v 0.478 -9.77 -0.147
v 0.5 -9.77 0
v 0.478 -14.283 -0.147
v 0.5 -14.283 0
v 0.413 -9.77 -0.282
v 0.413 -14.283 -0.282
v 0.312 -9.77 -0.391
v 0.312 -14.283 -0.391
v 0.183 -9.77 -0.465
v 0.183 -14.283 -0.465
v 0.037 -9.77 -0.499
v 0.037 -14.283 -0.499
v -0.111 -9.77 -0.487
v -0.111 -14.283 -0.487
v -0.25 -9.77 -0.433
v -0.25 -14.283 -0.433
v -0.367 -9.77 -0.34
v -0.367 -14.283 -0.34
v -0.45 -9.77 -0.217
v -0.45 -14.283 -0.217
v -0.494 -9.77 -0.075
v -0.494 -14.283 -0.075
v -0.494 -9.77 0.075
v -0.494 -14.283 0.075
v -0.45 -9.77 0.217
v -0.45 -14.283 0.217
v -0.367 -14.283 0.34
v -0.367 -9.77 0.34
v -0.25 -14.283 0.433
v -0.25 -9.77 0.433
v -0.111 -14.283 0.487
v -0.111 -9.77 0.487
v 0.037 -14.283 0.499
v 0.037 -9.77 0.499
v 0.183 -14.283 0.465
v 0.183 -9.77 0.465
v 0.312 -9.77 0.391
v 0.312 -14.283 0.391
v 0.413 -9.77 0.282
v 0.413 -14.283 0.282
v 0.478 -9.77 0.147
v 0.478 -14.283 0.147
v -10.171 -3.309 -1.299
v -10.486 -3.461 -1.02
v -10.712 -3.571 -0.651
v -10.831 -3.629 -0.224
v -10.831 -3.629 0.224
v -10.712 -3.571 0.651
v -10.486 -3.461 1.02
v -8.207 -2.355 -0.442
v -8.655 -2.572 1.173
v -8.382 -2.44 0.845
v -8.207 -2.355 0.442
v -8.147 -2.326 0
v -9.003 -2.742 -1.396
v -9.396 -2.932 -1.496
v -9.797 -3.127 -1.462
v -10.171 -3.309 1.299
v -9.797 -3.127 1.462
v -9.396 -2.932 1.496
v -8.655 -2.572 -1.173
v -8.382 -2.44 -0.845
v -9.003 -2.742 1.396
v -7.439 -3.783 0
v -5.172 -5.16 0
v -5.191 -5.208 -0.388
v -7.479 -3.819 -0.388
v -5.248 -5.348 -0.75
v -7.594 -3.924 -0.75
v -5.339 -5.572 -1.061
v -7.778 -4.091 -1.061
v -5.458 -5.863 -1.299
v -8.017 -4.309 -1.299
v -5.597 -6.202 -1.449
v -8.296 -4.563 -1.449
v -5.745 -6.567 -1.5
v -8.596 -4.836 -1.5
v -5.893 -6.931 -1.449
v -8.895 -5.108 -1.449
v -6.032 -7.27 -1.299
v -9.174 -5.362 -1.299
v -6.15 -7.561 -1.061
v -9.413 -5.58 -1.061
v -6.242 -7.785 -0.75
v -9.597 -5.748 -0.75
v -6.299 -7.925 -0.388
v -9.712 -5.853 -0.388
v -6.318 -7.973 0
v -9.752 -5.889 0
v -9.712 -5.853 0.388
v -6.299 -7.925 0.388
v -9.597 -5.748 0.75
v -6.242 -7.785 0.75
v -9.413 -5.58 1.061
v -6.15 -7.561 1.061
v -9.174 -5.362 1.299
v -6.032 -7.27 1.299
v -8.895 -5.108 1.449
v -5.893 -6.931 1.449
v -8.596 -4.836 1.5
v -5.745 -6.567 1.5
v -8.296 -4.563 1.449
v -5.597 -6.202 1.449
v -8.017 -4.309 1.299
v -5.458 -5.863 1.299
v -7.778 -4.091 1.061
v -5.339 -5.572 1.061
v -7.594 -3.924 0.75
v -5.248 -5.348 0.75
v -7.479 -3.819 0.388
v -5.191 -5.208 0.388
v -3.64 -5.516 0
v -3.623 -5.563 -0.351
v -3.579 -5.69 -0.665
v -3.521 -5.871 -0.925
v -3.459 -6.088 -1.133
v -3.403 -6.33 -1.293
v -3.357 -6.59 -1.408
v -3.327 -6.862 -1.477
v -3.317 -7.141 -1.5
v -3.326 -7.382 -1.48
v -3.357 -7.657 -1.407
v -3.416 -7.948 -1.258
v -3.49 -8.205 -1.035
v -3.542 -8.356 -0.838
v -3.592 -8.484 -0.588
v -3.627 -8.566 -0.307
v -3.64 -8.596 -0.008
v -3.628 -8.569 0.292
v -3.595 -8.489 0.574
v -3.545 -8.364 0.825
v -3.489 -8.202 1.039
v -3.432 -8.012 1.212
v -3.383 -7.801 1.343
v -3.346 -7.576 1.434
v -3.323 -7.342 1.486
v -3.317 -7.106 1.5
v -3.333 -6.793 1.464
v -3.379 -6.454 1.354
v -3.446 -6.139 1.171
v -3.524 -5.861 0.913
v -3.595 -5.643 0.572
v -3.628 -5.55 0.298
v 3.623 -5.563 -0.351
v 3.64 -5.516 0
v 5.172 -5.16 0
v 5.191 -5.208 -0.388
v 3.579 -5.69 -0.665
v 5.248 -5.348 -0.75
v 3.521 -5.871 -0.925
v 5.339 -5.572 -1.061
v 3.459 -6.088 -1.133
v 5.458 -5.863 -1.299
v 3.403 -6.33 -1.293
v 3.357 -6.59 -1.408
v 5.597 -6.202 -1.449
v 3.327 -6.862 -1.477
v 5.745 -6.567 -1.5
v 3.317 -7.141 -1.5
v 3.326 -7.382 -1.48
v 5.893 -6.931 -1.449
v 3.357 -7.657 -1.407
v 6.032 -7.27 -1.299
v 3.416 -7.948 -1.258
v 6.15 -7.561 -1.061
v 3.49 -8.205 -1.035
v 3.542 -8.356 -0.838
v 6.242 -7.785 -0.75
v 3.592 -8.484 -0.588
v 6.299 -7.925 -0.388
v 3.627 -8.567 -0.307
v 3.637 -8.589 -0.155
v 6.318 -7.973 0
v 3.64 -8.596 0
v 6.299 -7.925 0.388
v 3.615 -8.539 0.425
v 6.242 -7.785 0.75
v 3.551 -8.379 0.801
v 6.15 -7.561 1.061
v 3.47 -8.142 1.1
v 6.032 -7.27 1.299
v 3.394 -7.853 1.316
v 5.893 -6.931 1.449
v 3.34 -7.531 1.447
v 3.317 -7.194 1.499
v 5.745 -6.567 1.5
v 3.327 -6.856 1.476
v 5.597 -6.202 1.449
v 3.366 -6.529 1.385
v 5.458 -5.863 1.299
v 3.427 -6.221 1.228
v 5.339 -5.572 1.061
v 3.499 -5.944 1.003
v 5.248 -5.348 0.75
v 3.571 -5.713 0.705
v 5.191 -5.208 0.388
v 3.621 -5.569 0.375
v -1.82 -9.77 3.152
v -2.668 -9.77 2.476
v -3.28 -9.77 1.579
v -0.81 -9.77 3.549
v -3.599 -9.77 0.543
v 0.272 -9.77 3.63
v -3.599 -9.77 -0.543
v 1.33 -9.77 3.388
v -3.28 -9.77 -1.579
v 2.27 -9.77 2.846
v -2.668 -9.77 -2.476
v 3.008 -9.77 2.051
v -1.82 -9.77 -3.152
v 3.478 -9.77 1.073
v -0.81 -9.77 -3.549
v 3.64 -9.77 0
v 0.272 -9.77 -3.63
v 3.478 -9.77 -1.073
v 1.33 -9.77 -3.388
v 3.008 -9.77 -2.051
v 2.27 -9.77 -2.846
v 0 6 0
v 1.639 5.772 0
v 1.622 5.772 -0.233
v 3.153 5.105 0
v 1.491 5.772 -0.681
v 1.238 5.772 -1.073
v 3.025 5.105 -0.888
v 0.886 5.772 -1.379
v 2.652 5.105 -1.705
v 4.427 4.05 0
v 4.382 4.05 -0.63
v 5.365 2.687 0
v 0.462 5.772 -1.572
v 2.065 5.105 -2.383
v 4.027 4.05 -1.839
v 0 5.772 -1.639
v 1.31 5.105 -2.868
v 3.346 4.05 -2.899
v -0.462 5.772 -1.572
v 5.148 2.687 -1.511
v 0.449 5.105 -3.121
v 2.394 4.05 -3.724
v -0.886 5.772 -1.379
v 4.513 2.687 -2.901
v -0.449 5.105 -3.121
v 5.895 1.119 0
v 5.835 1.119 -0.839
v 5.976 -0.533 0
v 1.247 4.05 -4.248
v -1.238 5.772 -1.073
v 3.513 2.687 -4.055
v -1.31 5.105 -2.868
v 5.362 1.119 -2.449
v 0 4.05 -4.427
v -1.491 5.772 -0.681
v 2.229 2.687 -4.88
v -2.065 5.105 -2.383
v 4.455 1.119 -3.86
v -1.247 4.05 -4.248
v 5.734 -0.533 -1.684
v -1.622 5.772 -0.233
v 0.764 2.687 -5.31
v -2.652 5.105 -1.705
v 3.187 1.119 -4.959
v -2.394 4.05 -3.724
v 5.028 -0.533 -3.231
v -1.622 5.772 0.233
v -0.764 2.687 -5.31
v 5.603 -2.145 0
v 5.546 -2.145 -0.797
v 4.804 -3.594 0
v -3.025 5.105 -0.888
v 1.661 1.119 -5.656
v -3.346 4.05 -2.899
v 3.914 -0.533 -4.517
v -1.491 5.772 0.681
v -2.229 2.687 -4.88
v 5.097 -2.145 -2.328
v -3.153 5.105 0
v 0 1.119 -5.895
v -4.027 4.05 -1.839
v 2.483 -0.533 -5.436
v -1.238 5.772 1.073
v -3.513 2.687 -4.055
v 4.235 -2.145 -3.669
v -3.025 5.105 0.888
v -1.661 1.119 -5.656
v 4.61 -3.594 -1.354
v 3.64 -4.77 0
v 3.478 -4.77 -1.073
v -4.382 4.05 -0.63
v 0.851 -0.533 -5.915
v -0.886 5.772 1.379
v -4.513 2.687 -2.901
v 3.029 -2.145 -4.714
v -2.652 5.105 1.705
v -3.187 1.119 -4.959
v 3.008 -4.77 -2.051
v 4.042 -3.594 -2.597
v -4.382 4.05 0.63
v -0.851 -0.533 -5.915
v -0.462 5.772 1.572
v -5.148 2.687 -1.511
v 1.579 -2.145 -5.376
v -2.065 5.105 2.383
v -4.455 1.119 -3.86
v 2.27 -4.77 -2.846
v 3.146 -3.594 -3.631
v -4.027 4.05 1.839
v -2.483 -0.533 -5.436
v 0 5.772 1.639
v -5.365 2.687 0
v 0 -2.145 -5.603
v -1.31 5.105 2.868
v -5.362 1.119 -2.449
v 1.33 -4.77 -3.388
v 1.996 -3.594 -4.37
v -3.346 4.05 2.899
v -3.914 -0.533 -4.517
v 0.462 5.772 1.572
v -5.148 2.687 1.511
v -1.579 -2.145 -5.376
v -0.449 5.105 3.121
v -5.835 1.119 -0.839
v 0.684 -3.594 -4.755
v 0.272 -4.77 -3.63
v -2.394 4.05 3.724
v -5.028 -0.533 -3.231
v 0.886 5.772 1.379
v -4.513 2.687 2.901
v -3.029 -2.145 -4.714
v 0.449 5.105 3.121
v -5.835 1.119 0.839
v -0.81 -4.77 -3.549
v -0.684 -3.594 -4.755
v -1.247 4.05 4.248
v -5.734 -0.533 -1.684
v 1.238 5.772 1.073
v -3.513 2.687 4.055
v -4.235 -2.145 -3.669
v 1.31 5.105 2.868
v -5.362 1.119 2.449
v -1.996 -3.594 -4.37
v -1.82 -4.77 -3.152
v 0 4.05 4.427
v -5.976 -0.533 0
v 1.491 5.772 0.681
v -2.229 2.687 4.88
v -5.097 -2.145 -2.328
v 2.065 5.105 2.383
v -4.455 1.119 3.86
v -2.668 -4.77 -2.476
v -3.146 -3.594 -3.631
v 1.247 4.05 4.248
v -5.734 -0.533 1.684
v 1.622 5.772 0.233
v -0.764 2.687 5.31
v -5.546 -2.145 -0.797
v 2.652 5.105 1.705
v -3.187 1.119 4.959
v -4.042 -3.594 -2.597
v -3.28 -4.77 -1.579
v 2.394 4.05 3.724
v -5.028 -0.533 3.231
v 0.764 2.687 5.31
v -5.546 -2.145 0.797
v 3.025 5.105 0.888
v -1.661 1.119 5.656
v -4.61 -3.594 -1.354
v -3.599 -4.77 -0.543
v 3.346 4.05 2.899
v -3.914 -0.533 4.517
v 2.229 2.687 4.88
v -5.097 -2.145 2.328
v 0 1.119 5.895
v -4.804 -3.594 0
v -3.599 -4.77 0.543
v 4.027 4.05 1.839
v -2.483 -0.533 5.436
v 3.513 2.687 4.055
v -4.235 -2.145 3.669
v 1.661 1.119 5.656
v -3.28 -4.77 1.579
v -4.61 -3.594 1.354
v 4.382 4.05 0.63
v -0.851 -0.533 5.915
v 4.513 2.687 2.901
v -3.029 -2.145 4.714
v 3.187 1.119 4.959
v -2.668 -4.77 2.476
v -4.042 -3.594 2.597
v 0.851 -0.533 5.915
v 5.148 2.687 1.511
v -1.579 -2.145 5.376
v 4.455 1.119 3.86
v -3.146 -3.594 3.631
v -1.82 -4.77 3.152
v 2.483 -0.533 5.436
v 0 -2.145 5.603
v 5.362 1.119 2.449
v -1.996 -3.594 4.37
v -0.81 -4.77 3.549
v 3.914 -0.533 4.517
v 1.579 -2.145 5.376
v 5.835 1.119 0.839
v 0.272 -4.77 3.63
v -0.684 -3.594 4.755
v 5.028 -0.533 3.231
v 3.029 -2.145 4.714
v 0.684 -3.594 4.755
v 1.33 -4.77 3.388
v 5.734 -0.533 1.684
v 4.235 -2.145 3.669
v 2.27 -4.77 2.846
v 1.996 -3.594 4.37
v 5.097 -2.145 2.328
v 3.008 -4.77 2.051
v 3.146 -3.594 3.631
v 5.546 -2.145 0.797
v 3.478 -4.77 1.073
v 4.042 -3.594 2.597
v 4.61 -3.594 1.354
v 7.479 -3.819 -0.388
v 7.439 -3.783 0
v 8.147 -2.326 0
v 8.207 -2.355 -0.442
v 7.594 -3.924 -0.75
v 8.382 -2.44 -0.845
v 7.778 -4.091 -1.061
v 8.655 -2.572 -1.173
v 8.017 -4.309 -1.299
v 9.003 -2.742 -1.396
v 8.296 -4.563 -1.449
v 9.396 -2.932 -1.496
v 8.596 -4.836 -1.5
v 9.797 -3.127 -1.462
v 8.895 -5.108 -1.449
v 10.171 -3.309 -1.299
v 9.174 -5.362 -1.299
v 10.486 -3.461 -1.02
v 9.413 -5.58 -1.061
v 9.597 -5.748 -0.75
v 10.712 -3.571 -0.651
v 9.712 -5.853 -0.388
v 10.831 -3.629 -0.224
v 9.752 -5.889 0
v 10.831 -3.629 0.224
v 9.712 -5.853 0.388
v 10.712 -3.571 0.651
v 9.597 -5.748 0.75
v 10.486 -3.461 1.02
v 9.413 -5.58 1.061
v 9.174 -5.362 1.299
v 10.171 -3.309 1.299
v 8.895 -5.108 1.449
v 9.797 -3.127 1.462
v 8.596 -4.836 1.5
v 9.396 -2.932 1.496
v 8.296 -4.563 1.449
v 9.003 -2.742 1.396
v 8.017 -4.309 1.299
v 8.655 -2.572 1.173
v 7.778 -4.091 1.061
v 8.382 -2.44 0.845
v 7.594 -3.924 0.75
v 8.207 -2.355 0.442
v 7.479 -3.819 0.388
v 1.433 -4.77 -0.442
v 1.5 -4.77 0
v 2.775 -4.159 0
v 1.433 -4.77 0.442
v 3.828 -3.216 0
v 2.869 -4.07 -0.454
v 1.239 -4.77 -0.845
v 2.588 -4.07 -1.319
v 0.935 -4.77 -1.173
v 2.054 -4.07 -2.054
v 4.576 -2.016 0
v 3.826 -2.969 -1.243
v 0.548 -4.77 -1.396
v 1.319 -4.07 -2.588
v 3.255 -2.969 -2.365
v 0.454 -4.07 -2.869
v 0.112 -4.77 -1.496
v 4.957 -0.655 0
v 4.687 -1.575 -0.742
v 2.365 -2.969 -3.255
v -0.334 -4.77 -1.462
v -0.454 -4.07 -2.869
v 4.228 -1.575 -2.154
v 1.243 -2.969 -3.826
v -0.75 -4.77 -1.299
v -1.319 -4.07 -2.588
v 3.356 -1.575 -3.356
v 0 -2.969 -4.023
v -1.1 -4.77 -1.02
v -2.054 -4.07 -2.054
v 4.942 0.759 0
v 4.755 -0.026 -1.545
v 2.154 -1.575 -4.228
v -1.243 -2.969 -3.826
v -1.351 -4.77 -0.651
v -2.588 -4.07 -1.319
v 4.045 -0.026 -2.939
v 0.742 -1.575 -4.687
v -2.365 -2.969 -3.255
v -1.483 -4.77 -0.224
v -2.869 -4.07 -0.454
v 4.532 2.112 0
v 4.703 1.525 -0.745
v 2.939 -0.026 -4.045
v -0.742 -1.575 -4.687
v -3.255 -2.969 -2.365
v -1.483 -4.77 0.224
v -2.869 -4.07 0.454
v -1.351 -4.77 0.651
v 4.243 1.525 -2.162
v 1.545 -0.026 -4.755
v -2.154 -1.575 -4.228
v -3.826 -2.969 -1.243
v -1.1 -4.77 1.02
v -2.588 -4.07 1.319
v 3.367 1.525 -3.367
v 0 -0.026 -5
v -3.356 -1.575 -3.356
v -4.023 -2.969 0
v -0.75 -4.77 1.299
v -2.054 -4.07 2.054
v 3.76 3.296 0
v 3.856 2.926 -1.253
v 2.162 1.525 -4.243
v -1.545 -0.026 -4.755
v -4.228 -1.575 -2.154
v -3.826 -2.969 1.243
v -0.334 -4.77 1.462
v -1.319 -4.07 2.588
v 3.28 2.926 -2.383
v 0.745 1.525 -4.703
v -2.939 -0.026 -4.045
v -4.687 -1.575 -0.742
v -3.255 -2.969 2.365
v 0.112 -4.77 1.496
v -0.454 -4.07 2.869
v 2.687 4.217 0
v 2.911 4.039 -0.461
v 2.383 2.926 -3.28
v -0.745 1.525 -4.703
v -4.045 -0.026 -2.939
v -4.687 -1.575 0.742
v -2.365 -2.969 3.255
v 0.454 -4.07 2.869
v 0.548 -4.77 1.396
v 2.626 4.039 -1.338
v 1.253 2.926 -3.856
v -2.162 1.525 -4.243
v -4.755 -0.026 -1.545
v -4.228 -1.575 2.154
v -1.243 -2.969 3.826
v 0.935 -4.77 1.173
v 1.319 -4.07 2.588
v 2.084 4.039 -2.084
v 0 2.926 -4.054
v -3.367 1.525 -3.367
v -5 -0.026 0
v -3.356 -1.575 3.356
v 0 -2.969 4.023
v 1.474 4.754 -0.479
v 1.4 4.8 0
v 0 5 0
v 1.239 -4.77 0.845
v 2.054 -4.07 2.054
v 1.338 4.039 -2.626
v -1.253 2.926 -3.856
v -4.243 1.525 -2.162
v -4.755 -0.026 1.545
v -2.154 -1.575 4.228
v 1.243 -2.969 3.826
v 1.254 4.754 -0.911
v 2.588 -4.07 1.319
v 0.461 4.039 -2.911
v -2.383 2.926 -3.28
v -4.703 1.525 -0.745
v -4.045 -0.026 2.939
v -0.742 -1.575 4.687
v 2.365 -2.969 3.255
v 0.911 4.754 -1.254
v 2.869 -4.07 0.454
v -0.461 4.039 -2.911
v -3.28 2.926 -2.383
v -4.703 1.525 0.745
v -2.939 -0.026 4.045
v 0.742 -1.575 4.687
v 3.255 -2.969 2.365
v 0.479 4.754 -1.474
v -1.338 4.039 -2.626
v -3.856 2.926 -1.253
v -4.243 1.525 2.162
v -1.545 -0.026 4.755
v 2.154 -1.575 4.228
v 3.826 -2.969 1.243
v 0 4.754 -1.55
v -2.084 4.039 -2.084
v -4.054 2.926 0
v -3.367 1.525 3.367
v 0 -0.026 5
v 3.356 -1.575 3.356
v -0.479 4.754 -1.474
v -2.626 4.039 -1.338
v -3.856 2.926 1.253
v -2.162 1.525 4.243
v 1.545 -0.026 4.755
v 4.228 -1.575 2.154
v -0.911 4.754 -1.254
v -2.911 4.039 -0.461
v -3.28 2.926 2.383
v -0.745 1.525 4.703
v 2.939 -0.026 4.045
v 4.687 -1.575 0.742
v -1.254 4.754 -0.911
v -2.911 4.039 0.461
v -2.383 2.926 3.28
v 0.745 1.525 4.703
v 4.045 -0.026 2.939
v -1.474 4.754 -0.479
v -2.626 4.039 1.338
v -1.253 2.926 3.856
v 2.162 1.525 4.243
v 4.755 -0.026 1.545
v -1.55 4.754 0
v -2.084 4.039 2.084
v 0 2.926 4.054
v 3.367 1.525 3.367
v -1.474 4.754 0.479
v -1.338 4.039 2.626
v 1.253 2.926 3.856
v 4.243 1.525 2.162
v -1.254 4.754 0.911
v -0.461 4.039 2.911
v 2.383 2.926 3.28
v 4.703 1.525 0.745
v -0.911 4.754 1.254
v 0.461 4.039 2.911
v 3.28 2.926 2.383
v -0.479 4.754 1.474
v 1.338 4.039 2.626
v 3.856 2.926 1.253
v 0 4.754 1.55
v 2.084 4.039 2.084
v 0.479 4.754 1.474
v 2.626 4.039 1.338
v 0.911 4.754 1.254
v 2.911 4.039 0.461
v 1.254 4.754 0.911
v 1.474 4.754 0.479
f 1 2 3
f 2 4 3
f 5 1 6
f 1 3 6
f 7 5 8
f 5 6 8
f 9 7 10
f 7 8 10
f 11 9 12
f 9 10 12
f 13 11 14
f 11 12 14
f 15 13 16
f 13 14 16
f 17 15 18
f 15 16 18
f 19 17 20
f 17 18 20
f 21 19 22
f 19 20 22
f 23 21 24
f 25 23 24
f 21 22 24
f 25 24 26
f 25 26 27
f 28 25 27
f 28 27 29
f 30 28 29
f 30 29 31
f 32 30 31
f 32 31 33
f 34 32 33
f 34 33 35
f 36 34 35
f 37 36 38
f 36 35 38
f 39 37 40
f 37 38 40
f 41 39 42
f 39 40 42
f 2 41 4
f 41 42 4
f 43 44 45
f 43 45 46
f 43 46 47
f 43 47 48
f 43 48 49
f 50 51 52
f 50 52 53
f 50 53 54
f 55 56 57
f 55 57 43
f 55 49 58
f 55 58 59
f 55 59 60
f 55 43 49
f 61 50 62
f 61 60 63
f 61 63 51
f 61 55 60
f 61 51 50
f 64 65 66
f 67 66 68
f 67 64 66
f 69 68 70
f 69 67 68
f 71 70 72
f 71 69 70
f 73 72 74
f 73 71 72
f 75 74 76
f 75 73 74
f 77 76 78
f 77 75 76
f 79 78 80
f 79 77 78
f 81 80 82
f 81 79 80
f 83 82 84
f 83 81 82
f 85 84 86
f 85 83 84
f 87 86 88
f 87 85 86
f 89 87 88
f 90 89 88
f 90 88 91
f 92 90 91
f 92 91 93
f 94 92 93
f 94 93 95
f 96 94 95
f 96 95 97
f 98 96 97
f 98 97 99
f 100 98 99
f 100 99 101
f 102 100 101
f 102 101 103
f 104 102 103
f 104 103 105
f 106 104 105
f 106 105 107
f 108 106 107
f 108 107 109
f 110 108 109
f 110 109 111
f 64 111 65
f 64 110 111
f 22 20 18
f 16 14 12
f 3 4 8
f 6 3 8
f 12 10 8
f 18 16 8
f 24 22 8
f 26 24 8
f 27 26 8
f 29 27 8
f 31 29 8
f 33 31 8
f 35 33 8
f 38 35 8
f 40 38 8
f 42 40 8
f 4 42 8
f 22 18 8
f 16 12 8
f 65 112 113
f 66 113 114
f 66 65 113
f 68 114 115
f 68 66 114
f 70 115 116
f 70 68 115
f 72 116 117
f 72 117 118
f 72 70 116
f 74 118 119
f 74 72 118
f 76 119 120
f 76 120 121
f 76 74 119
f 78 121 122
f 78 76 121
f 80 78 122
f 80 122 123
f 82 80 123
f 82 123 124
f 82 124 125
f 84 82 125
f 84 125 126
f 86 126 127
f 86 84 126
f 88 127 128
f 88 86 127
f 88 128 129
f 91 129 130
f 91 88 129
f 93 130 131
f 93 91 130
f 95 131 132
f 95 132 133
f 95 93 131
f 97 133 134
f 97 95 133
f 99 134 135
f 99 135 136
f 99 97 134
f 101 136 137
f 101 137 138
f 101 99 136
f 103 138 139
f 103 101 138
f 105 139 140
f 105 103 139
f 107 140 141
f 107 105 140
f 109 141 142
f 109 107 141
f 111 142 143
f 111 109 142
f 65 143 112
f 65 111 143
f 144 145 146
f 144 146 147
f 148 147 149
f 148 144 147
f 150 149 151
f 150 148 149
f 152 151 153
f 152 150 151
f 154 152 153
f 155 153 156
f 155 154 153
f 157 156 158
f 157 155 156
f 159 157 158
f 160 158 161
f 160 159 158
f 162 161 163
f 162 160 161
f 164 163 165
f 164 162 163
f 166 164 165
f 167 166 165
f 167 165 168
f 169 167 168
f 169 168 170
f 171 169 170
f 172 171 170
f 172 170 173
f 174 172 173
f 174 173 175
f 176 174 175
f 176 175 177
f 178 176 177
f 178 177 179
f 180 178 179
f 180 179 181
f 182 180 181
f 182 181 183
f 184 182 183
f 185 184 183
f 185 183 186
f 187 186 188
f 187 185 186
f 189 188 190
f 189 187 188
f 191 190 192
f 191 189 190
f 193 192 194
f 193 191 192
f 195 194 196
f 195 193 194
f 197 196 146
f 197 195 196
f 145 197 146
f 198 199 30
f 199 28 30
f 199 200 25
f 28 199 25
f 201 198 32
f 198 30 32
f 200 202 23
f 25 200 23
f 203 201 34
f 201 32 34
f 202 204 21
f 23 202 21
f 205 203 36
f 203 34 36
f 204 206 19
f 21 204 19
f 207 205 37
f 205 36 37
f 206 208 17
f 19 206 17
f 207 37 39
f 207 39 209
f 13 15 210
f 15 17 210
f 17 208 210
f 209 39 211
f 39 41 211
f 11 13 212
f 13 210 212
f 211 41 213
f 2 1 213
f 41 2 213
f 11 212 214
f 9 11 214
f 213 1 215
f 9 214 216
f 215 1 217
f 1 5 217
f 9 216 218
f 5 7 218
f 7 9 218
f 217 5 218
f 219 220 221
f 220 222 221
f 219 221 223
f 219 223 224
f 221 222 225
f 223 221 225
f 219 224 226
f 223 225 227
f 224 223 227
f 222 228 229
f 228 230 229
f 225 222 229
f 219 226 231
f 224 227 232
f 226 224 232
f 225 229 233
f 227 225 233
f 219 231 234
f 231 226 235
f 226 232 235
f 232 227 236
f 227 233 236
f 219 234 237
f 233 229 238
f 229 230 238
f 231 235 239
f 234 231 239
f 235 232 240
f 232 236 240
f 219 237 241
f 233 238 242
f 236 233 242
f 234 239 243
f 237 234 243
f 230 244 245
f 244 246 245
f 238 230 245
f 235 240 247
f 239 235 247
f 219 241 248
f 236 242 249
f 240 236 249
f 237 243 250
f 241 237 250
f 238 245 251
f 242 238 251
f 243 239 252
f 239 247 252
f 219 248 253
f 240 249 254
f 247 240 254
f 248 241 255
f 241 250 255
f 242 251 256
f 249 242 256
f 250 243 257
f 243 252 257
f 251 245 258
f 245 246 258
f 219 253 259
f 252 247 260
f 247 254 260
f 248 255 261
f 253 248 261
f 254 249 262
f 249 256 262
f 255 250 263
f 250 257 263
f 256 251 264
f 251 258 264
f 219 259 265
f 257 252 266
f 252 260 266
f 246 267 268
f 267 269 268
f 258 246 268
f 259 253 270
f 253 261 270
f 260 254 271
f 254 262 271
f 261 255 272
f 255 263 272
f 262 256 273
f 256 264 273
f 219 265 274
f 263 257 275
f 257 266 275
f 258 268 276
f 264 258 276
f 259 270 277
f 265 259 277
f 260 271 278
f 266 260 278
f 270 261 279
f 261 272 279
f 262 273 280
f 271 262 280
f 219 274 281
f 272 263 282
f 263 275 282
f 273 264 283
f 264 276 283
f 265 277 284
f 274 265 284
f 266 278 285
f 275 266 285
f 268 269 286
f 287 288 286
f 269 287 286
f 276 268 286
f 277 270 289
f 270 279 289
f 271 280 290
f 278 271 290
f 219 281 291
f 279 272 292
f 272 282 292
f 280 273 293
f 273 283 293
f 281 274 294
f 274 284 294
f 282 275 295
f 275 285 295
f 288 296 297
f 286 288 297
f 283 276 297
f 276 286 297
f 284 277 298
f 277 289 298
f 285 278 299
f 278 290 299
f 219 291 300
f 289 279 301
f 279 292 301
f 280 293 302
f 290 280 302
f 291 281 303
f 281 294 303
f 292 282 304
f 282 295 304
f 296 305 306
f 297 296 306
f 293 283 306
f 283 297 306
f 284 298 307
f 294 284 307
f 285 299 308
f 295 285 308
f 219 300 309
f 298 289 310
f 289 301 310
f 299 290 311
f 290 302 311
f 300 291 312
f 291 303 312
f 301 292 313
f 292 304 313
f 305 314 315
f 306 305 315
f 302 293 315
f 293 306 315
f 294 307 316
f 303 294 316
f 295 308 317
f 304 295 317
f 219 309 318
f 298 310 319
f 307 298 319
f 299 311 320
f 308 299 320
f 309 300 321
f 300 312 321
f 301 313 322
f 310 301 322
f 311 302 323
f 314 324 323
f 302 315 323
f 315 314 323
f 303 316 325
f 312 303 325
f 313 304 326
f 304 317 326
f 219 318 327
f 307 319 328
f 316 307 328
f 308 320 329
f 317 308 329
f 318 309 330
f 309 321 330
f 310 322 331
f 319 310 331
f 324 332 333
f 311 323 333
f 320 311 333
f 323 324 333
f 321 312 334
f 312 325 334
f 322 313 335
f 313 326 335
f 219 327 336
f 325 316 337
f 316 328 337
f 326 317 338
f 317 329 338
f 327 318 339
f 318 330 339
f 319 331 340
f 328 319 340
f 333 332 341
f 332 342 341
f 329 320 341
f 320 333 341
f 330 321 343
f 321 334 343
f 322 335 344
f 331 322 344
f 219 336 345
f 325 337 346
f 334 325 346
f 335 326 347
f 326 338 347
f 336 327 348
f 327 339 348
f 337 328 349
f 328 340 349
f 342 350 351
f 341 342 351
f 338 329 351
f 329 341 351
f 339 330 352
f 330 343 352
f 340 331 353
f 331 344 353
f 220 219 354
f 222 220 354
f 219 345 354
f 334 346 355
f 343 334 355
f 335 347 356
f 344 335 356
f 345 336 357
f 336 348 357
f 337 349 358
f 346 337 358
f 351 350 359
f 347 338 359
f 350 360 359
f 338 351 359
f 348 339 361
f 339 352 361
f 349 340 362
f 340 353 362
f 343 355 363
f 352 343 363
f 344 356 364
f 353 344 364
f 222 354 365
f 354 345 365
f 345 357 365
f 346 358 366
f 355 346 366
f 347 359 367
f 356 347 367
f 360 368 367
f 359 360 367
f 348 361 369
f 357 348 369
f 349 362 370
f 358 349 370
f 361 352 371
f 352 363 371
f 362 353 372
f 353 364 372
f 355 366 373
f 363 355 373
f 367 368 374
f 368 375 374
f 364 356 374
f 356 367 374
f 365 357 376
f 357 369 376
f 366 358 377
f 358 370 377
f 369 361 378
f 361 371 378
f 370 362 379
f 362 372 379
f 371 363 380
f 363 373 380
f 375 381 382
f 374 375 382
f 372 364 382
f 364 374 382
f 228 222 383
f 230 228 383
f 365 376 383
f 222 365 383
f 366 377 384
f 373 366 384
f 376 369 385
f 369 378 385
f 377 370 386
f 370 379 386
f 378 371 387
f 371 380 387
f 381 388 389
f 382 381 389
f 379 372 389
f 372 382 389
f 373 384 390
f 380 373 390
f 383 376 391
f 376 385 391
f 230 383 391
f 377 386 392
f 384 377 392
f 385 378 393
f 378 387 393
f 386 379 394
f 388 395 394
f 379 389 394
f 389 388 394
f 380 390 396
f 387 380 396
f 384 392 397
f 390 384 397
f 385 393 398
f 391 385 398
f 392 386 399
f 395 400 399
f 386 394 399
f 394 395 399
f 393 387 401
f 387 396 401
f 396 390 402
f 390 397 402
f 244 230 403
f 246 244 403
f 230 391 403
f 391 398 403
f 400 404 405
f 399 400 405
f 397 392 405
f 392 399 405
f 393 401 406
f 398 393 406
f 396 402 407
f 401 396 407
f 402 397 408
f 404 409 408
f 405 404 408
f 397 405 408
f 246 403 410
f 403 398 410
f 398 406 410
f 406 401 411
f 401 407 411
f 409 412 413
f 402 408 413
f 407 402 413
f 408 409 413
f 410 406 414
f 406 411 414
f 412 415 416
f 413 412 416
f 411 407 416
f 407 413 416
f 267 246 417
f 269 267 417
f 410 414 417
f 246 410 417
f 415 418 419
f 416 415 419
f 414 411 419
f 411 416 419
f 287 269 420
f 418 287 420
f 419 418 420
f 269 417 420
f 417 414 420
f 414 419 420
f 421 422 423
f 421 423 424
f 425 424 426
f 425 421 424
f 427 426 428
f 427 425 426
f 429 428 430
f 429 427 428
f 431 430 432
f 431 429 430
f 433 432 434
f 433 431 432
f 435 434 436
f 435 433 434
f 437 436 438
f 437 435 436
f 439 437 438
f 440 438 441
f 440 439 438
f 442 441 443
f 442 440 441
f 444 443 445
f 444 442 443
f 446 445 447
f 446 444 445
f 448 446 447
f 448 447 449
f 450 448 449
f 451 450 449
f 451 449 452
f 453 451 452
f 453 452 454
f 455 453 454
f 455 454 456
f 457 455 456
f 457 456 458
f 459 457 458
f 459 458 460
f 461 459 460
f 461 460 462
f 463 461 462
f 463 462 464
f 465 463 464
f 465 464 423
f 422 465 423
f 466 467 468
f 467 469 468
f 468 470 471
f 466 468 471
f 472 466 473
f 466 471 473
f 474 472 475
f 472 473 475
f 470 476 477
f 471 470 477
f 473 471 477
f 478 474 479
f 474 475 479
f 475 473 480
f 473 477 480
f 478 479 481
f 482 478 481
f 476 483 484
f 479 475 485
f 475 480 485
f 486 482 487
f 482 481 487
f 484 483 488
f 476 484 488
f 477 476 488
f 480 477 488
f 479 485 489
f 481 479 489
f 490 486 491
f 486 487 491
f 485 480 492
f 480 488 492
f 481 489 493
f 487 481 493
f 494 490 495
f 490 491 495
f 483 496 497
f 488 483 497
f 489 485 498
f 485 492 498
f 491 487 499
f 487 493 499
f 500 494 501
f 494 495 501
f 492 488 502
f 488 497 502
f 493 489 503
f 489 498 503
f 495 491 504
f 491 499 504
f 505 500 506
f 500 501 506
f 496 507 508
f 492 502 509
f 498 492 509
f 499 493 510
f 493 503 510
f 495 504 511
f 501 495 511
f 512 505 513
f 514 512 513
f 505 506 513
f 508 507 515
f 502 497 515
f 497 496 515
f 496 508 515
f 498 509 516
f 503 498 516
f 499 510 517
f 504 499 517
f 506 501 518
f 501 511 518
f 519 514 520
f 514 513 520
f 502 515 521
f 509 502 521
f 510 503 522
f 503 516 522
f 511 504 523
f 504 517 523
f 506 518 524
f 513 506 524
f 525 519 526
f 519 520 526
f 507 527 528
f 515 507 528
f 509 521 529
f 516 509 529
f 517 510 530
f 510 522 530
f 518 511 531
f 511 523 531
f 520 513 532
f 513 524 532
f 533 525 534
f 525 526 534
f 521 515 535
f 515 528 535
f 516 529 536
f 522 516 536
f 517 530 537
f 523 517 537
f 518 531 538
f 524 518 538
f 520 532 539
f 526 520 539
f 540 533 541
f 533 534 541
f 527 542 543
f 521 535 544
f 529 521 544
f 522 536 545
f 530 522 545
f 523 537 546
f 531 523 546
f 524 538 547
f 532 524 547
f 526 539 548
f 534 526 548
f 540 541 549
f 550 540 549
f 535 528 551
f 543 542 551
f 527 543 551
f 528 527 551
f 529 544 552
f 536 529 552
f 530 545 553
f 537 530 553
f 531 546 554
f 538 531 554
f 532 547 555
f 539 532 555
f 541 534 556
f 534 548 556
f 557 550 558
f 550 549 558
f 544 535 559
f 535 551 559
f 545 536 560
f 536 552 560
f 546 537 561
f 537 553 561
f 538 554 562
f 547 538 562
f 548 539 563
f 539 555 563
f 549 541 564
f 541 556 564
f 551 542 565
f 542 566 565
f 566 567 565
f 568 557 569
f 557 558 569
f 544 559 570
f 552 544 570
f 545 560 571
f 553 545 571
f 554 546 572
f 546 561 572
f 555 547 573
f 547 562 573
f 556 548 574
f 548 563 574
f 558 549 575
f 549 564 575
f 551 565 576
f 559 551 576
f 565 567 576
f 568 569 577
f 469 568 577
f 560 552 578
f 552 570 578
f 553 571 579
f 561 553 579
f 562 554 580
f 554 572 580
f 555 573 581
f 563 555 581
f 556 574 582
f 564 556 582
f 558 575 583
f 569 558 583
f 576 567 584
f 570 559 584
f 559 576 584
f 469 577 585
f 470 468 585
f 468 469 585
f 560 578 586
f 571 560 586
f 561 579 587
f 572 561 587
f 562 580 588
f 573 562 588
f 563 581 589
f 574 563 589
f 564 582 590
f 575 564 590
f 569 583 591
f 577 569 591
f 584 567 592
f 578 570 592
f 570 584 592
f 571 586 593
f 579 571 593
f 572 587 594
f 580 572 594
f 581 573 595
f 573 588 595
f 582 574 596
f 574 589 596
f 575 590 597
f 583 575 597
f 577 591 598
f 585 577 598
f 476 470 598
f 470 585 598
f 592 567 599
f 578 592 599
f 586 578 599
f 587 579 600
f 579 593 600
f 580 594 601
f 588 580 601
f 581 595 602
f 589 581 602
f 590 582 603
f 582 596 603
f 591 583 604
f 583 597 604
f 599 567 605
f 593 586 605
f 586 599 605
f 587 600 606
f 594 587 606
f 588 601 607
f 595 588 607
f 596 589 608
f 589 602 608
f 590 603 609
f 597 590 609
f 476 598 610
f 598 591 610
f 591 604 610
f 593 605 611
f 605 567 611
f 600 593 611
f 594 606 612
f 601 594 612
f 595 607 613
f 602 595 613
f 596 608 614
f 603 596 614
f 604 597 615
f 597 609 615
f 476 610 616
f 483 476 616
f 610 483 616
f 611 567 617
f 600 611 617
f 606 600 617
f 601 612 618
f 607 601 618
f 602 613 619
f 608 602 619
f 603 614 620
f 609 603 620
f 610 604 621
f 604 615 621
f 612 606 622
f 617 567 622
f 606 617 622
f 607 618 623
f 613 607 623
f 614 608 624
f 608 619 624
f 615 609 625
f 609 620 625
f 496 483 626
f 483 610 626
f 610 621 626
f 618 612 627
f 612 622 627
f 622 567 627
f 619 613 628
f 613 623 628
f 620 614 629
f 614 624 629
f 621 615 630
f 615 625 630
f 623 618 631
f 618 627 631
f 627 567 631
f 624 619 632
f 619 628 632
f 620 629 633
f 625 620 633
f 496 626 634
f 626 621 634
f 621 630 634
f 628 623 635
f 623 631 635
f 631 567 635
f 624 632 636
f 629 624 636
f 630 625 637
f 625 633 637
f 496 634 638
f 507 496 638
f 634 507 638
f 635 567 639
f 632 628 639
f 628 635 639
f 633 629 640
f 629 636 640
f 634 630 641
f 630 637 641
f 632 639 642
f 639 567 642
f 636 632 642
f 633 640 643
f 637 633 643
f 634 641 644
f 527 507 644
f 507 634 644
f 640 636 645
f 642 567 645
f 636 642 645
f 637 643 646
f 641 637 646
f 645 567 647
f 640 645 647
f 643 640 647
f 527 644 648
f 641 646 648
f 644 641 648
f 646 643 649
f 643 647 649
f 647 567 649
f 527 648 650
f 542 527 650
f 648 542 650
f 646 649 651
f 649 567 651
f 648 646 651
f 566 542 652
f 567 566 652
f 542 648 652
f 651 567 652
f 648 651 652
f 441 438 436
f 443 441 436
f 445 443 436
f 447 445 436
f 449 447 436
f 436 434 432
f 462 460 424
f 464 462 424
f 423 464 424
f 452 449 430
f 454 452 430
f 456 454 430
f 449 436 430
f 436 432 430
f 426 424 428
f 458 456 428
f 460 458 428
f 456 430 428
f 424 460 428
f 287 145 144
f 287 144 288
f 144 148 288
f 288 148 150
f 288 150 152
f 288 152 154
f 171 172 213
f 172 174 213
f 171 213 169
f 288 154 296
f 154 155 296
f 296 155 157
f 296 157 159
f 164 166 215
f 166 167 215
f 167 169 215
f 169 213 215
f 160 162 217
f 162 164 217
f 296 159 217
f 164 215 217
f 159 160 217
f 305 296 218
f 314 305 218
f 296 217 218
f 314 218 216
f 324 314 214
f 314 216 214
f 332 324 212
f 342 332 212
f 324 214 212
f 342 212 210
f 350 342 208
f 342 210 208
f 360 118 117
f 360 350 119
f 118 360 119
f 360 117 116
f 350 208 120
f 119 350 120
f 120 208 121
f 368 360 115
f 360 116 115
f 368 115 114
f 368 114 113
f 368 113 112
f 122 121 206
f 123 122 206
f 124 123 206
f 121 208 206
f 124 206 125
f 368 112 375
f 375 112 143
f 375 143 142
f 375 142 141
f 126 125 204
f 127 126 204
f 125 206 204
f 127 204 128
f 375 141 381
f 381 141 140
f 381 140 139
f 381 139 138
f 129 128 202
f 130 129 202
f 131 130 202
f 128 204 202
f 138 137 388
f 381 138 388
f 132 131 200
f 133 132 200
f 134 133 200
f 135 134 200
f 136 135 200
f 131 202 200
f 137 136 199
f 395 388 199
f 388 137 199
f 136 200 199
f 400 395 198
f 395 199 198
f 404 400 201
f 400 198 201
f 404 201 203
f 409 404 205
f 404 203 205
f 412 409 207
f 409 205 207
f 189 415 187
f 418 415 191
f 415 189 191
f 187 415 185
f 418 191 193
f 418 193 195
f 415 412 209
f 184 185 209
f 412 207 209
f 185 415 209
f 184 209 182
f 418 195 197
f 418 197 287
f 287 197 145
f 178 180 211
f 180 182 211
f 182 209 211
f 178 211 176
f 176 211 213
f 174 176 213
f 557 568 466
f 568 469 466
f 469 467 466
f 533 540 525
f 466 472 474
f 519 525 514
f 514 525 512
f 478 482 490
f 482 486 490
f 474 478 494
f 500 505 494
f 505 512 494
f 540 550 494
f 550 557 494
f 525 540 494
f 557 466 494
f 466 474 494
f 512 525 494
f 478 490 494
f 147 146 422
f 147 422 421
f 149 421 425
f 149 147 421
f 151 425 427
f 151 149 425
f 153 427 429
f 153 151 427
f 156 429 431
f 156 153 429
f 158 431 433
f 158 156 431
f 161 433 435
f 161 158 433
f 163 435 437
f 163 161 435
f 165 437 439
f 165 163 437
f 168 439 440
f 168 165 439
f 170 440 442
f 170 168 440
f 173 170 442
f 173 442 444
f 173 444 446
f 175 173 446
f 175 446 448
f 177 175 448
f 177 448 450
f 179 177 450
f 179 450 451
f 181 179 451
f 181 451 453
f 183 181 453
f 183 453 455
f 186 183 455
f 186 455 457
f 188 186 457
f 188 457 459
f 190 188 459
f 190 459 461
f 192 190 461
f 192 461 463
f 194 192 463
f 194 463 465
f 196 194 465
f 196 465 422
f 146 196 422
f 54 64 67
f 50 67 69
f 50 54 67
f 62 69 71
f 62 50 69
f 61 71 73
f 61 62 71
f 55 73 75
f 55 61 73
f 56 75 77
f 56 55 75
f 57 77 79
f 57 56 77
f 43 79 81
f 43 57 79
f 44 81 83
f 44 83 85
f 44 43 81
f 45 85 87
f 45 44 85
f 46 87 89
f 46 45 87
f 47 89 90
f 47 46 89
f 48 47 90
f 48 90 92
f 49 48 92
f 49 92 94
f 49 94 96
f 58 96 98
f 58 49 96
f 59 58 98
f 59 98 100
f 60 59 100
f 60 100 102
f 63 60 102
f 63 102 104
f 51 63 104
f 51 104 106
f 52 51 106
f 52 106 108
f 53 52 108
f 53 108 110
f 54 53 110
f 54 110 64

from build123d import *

# Parameters (mm, degrees)
SWEEP1_PROFILE_R = 1.5


with BuildPart() as part:
    # Esquisse1 → Révolution4 (revolve)
    with BuildSketch(Plane.XY):
        with BuildLine():
            Line((0, 5), (0, 6))
            ThreePointArc((0, 6), (5.684108375, 1.921174635), (3.640054945, -4.769696007))
            Line((3.640054945, -4.769696007), (3.640054945, -9.769696007))
            Line((3.640054945, -9.769696007), (0.5, -9.769696007))
            Line((0.5, -9.769696007), (0.5, -14.283094956))
            Line((0.5, -14.283094956), (0, -14.283094956))
            Line((0, -14.283094956), (0, -4.769696007))
            Line((0, -4.769696007), (1.5, -4.769696007))
            ThreePointArc((1.5, -4.769696007), (4.942088629, 0.758788496), (0, 5))
        make_face()
    revolve(axis=Axis((0, 0, 0), (0, 1, 0)))

    # Sweep1: sweep along a path in Sketch1
    with BuildLine(Plane.XY) as sweep1_path:
        Line((9.49641969, -2.980934088), (8.595599399, -4.835775301))
        Line((8.595599399, -4.835775301), (5.744918771, -6.566545682))
        Line((5.744918771, -6.566545682), (3.118220193, -7.177405817))
        Line((3.118220193, -7.177405817), (-3.118220193, -7.177405817))
        Line((-3.118220193, -7.177405817), (-5.744918771, -6.566545682))
        Line((-5.744918771, -6.566545682), (-8.595599399, -4.835775301))
        Line((-8.595599399, -4.835775301), (-9.49641969, -2.980934088))
    # Sweep1 profile (on start of the path) → Sweep1 (sweep)
    with BuildSketch(Plane(origin=(9.49641969, -2.980934088, 0), x_dir=(-0.8995277091216457, 0.4368637093217566, 0), z_dir=(-0.4368637093217566, -0.8995277091216457, 0))):
        Circle(SWEEP1_PROFILE_R)
    sweep(path=sweep1_path.line, transition=Transition.RIGHT)


solid = part.part
